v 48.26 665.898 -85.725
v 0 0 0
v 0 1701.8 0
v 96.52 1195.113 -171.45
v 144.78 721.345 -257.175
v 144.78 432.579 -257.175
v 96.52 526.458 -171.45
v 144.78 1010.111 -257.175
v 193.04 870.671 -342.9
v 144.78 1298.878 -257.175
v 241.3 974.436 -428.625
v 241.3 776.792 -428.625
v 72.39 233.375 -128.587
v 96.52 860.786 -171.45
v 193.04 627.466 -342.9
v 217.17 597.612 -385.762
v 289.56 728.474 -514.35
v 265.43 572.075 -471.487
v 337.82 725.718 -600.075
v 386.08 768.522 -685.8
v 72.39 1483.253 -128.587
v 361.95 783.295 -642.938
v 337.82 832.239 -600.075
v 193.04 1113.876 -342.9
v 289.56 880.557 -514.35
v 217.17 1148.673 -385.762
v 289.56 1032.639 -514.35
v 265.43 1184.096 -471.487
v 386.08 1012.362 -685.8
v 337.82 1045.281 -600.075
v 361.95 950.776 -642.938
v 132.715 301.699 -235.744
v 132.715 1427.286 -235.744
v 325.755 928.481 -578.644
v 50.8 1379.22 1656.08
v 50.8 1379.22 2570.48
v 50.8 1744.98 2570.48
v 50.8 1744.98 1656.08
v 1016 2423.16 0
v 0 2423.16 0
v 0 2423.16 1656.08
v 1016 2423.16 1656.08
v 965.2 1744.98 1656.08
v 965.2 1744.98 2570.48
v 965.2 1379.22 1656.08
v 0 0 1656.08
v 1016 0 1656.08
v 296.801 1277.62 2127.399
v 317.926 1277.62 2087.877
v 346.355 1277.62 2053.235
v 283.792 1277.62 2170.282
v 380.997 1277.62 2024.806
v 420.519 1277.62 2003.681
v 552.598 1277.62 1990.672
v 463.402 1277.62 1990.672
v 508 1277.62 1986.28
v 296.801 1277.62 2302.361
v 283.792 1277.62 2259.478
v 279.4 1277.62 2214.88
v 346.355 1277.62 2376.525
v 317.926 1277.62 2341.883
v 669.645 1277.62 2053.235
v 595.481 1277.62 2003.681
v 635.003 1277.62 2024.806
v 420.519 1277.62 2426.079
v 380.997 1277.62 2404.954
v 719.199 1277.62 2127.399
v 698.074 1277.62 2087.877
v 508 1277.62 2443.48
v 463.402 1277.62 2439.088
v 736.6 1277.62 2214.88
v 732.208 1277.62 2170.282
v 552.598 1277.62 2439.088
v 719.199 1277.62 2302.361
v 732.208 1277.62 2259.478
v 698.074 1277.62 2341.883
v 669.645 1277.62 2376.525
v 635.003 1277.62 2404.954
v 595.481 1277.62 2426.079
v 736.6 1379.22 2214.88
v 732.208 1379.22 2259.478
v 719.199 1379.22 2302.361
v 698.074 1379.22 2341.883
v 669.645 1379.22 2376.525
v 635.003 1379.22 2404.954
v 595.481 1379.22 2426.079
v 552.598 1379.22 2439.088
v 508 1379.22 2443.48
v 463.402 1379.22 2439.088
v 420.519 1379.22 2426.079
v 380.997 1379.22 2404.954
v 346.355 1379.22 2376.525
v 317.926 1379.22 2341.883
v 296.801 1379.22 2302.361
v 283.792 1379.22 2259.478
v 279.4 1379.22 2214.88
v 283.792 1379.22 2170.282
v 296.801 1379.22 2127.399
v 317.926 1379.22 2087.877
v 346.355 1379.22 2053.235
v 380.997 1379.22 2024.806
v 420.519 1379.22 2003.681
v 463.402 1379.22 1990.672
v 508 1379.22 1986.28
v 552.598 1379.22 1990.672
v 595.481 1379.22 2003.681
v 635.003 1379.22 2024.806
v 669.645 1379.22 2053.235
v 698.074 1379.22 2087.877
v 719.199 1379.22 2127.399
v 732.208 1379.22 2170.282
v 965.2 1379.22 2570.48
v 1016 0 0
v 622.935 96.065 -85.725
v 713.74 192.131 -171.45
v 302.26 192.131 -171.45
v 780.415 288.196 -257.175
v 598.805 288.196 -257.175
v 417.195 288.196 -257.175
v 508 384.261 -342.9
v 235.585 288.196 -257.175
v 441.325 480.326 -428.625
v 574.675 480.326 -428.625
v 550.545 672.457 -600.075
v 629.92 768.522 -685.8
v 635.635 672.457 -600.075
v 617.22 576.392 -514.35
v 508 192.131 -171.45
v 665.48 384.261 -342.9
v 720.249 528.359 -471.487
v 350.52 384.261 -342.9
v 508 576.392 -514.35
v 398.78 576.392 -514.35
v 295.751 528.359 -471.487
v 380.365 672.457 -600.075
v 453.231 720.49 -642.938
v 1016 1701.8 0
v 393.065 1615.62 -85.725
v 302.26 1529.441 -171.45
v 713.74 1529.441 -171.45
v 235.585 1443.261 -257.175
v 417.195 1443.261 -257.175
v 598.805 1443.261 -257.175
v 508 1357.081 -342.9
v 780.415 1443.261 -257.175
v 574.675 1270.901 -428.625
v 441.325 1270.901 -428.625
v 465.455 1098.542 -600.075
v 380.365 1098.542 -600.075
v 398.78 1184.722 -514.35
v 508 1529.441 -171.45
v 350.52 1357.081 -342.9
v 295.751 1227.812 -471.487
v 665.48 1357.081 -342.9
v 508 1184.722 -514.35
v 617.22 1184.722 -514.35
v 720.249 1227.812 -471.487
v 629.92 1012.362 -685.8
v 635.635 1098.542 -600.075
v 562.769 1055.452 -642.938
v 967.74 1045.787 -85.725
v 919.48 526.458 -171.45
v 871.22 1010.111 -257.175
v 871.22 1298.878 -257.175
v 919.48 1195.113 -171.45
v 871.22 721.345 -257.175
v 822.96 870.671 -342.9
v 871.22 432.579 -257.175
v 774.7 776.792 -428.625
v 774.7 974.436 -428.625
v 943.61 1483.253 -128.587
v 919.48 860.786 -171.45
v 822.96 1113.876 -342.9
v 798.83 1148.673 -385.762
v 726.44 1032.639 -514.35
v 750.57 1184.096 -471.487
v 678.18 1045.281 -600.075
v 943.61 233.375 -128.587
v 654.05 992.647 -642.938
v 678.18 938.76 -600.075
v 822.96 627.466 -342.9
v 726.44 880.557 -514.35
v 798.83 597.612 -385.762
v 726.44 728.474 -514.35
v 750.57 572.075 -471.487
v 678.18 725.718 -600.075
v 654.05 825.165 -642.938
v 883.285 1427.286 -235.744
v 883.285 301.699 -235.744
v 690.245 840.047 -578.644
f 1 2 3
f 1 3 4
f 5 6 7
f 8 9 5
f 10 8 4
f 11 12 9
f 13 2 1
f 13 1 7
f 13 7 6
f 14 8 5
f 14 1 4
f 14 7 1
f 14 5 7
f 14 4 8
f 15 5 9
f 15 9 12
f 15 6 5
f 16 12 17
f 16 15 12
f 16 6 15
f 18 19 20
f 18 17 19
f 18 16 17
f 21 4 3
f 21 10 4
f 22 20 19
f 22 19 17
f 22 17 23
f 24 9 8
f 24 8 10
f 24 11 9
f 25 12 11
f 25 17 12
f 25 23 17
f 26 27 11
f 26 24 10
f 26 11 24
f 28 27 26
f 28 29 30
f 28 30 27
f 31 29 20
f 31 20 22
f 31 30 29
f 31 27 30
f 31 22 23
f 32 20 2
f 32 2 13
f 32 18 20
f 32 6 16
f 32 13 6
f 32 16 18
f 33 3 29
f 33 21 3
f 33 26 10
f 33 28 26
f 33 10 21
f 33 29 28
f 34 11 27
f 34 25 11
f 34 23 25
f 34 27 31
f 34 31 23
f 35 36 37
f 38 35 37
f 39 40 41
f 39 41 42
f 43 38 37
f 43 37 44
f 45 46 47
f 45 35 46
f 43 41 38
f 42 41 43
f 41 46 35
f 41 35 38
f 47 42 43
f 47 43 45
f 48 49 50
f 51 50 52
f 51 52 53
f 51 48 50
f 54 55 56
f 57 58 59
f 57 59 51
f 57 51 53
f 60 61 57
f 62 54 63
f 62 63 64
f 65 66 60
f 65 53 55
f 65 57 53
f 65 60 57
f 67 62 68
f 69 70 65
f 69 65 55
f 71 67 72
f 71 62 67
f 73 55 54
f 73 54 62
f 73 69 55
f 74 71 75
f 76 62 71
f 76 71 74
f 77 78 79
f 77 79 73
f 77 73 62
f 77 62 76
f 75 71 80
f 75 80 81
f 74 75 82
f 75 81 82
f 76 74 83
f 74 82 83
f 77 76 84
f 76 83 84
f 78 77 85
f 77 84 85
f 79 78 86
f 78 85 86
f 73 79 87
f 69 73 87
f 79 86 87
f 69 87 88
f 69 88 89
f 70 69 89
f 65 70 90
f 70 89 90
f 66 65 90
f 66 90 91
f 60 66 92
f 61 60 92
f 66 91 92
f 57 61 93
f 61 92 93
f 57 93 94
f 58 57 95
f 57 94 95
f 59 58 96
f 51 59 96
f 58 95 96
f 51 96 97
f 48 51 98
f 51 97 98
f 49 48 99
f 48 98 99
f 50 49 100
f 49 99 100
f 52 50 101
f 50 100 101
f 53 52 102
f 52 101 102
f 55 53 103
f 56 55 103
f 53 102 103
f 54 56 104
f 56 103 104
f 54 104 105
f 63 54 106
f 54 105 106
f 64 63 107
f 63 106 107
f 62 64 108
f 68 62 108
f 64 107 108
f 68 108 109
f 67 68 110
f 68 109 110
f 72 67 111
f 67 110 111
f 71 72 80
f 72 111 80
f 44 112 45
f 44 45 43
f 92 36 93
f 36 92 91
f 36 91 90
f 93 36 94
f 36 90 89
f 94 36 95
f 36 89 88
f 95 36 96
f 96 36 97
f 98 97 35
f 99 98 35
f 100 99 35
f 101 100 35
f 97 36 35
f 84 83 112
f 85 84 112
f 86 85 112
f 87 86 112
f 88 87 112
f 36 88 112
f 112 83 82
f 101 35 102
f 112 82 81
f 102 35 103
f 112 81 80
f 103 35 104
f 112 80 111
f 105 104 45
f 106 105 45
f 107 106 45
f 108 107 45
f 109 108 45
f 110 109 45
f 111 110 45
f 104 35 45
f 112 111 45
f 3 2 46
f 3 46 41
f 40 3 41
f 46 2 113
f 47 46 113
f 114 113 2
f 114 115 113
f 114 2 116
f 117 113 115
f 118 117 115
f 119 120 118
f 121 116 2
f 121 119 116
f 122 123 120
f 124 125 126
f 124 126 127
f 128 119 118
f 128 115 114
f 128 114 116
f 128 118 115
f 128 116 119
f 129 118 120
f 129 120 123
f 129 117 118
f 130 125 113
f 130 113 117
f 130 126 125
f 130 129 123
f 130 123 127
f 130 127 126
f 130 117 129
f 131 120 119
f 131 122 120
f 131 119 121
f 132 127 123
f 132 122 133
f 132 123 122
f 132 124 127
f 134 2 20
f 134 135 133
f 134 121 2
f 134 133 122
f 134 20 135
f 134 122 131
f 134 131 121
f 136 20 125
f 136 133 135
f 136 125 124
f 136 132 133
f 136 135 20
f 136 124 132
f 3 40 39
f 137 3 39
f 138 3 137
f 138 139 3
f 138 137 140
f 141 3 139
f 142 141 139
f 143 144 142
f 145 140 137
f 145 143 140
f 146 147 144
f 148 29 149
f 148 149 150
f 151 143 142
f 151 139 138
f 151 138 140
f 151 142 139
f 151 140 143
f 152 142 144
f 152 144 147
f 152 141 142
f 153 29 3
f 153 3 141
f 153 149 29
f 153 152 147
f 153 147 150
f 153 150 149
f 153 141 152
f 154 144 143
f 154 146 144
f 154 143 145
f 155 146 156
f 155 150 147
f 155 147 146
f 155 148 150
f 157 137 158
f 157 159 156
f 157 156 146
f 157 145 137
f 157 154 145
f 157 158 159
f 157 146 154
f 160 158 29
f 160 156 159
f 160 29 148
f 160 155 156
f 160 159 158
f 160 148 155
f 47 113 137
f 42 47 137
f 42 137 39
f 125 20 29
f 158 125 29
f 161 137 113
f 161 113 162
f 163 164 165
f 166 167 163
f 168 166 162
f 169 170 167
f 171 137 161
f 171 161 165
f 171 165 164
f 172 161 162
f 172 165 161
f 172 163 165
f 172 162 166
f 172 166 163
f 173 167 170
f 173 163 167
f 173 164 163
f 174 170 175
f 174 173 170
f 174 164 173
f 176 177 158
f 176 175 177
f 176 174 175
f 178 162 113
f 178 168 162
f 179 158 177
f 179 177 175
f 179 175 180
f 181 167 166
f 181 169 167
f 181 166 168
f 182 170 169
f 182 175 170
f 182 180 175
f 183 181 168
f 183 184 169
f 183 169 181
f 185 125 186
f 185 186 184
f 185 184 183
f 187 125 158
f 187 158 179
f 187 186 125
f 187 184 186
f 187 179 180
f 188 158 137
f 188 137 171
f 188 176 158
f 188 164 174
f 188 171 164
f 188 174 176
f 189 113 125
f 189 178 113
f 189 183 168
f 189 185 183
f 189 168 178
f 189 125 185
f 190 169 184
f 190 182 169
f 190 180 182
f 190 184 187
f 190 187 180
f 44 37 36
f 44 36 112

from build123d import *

# Parameters (mm, degrees)
F0_W     = 1016
F0_H     = 2423.16
F1_DEPTH = 1656.08
F2_W     = 914.4
F2_H     = 365.76
F3_DEPTH = 914.4
F4_R     = 228.6
F5_DEPTH = 101.6
F7_W     = 1016
F7_H     = 1701.8
F8_W     = 243.84
F8_H     = 243.84


with BuildPart() as f1:
    # F0 (on Top) → F1 (new body)
    with BuildSketch(Plane.XY):
        with Locations((508, 1211.58)):
            Rectangle(F0_W, F0_H)
    extrude(amount=F1_DEPTH)

    # F2 (on face) → F3 (join)
    with BuildSketch(Plane.XY.offset(1656.08)):
        with Locations((508, 1562.1)):
            Rectangle(F2_W, F2_H)
    extrude(amount=F3_DEPTH)

    # F4 (on face) → F5 (join)
    with BuildSketch(Plane.XZ.offset(-1379.22)):
        with Locations((508, 2214.88)):
            Circle(F4_R)
    extrude(amount=F5_DEPTH)

    # F7 (on face) → F9 section 0
    with BuildSketch(Plane(origin=(0, 0, 0), x_dir=(1, 0, 0), z_dir=(0, 0, -1))):
        with Locations((508, -850.9)):
            Rectangle(F7_W, F7_H)
    # F8 (on offset) → F9 section 1
    with BuildSketch(Plane.XY.offset(-685.8)):
        with Locations((508, 890.442318)):
            Rectangle(F8_W, F8_H)
    loft()


solid = f1.part
